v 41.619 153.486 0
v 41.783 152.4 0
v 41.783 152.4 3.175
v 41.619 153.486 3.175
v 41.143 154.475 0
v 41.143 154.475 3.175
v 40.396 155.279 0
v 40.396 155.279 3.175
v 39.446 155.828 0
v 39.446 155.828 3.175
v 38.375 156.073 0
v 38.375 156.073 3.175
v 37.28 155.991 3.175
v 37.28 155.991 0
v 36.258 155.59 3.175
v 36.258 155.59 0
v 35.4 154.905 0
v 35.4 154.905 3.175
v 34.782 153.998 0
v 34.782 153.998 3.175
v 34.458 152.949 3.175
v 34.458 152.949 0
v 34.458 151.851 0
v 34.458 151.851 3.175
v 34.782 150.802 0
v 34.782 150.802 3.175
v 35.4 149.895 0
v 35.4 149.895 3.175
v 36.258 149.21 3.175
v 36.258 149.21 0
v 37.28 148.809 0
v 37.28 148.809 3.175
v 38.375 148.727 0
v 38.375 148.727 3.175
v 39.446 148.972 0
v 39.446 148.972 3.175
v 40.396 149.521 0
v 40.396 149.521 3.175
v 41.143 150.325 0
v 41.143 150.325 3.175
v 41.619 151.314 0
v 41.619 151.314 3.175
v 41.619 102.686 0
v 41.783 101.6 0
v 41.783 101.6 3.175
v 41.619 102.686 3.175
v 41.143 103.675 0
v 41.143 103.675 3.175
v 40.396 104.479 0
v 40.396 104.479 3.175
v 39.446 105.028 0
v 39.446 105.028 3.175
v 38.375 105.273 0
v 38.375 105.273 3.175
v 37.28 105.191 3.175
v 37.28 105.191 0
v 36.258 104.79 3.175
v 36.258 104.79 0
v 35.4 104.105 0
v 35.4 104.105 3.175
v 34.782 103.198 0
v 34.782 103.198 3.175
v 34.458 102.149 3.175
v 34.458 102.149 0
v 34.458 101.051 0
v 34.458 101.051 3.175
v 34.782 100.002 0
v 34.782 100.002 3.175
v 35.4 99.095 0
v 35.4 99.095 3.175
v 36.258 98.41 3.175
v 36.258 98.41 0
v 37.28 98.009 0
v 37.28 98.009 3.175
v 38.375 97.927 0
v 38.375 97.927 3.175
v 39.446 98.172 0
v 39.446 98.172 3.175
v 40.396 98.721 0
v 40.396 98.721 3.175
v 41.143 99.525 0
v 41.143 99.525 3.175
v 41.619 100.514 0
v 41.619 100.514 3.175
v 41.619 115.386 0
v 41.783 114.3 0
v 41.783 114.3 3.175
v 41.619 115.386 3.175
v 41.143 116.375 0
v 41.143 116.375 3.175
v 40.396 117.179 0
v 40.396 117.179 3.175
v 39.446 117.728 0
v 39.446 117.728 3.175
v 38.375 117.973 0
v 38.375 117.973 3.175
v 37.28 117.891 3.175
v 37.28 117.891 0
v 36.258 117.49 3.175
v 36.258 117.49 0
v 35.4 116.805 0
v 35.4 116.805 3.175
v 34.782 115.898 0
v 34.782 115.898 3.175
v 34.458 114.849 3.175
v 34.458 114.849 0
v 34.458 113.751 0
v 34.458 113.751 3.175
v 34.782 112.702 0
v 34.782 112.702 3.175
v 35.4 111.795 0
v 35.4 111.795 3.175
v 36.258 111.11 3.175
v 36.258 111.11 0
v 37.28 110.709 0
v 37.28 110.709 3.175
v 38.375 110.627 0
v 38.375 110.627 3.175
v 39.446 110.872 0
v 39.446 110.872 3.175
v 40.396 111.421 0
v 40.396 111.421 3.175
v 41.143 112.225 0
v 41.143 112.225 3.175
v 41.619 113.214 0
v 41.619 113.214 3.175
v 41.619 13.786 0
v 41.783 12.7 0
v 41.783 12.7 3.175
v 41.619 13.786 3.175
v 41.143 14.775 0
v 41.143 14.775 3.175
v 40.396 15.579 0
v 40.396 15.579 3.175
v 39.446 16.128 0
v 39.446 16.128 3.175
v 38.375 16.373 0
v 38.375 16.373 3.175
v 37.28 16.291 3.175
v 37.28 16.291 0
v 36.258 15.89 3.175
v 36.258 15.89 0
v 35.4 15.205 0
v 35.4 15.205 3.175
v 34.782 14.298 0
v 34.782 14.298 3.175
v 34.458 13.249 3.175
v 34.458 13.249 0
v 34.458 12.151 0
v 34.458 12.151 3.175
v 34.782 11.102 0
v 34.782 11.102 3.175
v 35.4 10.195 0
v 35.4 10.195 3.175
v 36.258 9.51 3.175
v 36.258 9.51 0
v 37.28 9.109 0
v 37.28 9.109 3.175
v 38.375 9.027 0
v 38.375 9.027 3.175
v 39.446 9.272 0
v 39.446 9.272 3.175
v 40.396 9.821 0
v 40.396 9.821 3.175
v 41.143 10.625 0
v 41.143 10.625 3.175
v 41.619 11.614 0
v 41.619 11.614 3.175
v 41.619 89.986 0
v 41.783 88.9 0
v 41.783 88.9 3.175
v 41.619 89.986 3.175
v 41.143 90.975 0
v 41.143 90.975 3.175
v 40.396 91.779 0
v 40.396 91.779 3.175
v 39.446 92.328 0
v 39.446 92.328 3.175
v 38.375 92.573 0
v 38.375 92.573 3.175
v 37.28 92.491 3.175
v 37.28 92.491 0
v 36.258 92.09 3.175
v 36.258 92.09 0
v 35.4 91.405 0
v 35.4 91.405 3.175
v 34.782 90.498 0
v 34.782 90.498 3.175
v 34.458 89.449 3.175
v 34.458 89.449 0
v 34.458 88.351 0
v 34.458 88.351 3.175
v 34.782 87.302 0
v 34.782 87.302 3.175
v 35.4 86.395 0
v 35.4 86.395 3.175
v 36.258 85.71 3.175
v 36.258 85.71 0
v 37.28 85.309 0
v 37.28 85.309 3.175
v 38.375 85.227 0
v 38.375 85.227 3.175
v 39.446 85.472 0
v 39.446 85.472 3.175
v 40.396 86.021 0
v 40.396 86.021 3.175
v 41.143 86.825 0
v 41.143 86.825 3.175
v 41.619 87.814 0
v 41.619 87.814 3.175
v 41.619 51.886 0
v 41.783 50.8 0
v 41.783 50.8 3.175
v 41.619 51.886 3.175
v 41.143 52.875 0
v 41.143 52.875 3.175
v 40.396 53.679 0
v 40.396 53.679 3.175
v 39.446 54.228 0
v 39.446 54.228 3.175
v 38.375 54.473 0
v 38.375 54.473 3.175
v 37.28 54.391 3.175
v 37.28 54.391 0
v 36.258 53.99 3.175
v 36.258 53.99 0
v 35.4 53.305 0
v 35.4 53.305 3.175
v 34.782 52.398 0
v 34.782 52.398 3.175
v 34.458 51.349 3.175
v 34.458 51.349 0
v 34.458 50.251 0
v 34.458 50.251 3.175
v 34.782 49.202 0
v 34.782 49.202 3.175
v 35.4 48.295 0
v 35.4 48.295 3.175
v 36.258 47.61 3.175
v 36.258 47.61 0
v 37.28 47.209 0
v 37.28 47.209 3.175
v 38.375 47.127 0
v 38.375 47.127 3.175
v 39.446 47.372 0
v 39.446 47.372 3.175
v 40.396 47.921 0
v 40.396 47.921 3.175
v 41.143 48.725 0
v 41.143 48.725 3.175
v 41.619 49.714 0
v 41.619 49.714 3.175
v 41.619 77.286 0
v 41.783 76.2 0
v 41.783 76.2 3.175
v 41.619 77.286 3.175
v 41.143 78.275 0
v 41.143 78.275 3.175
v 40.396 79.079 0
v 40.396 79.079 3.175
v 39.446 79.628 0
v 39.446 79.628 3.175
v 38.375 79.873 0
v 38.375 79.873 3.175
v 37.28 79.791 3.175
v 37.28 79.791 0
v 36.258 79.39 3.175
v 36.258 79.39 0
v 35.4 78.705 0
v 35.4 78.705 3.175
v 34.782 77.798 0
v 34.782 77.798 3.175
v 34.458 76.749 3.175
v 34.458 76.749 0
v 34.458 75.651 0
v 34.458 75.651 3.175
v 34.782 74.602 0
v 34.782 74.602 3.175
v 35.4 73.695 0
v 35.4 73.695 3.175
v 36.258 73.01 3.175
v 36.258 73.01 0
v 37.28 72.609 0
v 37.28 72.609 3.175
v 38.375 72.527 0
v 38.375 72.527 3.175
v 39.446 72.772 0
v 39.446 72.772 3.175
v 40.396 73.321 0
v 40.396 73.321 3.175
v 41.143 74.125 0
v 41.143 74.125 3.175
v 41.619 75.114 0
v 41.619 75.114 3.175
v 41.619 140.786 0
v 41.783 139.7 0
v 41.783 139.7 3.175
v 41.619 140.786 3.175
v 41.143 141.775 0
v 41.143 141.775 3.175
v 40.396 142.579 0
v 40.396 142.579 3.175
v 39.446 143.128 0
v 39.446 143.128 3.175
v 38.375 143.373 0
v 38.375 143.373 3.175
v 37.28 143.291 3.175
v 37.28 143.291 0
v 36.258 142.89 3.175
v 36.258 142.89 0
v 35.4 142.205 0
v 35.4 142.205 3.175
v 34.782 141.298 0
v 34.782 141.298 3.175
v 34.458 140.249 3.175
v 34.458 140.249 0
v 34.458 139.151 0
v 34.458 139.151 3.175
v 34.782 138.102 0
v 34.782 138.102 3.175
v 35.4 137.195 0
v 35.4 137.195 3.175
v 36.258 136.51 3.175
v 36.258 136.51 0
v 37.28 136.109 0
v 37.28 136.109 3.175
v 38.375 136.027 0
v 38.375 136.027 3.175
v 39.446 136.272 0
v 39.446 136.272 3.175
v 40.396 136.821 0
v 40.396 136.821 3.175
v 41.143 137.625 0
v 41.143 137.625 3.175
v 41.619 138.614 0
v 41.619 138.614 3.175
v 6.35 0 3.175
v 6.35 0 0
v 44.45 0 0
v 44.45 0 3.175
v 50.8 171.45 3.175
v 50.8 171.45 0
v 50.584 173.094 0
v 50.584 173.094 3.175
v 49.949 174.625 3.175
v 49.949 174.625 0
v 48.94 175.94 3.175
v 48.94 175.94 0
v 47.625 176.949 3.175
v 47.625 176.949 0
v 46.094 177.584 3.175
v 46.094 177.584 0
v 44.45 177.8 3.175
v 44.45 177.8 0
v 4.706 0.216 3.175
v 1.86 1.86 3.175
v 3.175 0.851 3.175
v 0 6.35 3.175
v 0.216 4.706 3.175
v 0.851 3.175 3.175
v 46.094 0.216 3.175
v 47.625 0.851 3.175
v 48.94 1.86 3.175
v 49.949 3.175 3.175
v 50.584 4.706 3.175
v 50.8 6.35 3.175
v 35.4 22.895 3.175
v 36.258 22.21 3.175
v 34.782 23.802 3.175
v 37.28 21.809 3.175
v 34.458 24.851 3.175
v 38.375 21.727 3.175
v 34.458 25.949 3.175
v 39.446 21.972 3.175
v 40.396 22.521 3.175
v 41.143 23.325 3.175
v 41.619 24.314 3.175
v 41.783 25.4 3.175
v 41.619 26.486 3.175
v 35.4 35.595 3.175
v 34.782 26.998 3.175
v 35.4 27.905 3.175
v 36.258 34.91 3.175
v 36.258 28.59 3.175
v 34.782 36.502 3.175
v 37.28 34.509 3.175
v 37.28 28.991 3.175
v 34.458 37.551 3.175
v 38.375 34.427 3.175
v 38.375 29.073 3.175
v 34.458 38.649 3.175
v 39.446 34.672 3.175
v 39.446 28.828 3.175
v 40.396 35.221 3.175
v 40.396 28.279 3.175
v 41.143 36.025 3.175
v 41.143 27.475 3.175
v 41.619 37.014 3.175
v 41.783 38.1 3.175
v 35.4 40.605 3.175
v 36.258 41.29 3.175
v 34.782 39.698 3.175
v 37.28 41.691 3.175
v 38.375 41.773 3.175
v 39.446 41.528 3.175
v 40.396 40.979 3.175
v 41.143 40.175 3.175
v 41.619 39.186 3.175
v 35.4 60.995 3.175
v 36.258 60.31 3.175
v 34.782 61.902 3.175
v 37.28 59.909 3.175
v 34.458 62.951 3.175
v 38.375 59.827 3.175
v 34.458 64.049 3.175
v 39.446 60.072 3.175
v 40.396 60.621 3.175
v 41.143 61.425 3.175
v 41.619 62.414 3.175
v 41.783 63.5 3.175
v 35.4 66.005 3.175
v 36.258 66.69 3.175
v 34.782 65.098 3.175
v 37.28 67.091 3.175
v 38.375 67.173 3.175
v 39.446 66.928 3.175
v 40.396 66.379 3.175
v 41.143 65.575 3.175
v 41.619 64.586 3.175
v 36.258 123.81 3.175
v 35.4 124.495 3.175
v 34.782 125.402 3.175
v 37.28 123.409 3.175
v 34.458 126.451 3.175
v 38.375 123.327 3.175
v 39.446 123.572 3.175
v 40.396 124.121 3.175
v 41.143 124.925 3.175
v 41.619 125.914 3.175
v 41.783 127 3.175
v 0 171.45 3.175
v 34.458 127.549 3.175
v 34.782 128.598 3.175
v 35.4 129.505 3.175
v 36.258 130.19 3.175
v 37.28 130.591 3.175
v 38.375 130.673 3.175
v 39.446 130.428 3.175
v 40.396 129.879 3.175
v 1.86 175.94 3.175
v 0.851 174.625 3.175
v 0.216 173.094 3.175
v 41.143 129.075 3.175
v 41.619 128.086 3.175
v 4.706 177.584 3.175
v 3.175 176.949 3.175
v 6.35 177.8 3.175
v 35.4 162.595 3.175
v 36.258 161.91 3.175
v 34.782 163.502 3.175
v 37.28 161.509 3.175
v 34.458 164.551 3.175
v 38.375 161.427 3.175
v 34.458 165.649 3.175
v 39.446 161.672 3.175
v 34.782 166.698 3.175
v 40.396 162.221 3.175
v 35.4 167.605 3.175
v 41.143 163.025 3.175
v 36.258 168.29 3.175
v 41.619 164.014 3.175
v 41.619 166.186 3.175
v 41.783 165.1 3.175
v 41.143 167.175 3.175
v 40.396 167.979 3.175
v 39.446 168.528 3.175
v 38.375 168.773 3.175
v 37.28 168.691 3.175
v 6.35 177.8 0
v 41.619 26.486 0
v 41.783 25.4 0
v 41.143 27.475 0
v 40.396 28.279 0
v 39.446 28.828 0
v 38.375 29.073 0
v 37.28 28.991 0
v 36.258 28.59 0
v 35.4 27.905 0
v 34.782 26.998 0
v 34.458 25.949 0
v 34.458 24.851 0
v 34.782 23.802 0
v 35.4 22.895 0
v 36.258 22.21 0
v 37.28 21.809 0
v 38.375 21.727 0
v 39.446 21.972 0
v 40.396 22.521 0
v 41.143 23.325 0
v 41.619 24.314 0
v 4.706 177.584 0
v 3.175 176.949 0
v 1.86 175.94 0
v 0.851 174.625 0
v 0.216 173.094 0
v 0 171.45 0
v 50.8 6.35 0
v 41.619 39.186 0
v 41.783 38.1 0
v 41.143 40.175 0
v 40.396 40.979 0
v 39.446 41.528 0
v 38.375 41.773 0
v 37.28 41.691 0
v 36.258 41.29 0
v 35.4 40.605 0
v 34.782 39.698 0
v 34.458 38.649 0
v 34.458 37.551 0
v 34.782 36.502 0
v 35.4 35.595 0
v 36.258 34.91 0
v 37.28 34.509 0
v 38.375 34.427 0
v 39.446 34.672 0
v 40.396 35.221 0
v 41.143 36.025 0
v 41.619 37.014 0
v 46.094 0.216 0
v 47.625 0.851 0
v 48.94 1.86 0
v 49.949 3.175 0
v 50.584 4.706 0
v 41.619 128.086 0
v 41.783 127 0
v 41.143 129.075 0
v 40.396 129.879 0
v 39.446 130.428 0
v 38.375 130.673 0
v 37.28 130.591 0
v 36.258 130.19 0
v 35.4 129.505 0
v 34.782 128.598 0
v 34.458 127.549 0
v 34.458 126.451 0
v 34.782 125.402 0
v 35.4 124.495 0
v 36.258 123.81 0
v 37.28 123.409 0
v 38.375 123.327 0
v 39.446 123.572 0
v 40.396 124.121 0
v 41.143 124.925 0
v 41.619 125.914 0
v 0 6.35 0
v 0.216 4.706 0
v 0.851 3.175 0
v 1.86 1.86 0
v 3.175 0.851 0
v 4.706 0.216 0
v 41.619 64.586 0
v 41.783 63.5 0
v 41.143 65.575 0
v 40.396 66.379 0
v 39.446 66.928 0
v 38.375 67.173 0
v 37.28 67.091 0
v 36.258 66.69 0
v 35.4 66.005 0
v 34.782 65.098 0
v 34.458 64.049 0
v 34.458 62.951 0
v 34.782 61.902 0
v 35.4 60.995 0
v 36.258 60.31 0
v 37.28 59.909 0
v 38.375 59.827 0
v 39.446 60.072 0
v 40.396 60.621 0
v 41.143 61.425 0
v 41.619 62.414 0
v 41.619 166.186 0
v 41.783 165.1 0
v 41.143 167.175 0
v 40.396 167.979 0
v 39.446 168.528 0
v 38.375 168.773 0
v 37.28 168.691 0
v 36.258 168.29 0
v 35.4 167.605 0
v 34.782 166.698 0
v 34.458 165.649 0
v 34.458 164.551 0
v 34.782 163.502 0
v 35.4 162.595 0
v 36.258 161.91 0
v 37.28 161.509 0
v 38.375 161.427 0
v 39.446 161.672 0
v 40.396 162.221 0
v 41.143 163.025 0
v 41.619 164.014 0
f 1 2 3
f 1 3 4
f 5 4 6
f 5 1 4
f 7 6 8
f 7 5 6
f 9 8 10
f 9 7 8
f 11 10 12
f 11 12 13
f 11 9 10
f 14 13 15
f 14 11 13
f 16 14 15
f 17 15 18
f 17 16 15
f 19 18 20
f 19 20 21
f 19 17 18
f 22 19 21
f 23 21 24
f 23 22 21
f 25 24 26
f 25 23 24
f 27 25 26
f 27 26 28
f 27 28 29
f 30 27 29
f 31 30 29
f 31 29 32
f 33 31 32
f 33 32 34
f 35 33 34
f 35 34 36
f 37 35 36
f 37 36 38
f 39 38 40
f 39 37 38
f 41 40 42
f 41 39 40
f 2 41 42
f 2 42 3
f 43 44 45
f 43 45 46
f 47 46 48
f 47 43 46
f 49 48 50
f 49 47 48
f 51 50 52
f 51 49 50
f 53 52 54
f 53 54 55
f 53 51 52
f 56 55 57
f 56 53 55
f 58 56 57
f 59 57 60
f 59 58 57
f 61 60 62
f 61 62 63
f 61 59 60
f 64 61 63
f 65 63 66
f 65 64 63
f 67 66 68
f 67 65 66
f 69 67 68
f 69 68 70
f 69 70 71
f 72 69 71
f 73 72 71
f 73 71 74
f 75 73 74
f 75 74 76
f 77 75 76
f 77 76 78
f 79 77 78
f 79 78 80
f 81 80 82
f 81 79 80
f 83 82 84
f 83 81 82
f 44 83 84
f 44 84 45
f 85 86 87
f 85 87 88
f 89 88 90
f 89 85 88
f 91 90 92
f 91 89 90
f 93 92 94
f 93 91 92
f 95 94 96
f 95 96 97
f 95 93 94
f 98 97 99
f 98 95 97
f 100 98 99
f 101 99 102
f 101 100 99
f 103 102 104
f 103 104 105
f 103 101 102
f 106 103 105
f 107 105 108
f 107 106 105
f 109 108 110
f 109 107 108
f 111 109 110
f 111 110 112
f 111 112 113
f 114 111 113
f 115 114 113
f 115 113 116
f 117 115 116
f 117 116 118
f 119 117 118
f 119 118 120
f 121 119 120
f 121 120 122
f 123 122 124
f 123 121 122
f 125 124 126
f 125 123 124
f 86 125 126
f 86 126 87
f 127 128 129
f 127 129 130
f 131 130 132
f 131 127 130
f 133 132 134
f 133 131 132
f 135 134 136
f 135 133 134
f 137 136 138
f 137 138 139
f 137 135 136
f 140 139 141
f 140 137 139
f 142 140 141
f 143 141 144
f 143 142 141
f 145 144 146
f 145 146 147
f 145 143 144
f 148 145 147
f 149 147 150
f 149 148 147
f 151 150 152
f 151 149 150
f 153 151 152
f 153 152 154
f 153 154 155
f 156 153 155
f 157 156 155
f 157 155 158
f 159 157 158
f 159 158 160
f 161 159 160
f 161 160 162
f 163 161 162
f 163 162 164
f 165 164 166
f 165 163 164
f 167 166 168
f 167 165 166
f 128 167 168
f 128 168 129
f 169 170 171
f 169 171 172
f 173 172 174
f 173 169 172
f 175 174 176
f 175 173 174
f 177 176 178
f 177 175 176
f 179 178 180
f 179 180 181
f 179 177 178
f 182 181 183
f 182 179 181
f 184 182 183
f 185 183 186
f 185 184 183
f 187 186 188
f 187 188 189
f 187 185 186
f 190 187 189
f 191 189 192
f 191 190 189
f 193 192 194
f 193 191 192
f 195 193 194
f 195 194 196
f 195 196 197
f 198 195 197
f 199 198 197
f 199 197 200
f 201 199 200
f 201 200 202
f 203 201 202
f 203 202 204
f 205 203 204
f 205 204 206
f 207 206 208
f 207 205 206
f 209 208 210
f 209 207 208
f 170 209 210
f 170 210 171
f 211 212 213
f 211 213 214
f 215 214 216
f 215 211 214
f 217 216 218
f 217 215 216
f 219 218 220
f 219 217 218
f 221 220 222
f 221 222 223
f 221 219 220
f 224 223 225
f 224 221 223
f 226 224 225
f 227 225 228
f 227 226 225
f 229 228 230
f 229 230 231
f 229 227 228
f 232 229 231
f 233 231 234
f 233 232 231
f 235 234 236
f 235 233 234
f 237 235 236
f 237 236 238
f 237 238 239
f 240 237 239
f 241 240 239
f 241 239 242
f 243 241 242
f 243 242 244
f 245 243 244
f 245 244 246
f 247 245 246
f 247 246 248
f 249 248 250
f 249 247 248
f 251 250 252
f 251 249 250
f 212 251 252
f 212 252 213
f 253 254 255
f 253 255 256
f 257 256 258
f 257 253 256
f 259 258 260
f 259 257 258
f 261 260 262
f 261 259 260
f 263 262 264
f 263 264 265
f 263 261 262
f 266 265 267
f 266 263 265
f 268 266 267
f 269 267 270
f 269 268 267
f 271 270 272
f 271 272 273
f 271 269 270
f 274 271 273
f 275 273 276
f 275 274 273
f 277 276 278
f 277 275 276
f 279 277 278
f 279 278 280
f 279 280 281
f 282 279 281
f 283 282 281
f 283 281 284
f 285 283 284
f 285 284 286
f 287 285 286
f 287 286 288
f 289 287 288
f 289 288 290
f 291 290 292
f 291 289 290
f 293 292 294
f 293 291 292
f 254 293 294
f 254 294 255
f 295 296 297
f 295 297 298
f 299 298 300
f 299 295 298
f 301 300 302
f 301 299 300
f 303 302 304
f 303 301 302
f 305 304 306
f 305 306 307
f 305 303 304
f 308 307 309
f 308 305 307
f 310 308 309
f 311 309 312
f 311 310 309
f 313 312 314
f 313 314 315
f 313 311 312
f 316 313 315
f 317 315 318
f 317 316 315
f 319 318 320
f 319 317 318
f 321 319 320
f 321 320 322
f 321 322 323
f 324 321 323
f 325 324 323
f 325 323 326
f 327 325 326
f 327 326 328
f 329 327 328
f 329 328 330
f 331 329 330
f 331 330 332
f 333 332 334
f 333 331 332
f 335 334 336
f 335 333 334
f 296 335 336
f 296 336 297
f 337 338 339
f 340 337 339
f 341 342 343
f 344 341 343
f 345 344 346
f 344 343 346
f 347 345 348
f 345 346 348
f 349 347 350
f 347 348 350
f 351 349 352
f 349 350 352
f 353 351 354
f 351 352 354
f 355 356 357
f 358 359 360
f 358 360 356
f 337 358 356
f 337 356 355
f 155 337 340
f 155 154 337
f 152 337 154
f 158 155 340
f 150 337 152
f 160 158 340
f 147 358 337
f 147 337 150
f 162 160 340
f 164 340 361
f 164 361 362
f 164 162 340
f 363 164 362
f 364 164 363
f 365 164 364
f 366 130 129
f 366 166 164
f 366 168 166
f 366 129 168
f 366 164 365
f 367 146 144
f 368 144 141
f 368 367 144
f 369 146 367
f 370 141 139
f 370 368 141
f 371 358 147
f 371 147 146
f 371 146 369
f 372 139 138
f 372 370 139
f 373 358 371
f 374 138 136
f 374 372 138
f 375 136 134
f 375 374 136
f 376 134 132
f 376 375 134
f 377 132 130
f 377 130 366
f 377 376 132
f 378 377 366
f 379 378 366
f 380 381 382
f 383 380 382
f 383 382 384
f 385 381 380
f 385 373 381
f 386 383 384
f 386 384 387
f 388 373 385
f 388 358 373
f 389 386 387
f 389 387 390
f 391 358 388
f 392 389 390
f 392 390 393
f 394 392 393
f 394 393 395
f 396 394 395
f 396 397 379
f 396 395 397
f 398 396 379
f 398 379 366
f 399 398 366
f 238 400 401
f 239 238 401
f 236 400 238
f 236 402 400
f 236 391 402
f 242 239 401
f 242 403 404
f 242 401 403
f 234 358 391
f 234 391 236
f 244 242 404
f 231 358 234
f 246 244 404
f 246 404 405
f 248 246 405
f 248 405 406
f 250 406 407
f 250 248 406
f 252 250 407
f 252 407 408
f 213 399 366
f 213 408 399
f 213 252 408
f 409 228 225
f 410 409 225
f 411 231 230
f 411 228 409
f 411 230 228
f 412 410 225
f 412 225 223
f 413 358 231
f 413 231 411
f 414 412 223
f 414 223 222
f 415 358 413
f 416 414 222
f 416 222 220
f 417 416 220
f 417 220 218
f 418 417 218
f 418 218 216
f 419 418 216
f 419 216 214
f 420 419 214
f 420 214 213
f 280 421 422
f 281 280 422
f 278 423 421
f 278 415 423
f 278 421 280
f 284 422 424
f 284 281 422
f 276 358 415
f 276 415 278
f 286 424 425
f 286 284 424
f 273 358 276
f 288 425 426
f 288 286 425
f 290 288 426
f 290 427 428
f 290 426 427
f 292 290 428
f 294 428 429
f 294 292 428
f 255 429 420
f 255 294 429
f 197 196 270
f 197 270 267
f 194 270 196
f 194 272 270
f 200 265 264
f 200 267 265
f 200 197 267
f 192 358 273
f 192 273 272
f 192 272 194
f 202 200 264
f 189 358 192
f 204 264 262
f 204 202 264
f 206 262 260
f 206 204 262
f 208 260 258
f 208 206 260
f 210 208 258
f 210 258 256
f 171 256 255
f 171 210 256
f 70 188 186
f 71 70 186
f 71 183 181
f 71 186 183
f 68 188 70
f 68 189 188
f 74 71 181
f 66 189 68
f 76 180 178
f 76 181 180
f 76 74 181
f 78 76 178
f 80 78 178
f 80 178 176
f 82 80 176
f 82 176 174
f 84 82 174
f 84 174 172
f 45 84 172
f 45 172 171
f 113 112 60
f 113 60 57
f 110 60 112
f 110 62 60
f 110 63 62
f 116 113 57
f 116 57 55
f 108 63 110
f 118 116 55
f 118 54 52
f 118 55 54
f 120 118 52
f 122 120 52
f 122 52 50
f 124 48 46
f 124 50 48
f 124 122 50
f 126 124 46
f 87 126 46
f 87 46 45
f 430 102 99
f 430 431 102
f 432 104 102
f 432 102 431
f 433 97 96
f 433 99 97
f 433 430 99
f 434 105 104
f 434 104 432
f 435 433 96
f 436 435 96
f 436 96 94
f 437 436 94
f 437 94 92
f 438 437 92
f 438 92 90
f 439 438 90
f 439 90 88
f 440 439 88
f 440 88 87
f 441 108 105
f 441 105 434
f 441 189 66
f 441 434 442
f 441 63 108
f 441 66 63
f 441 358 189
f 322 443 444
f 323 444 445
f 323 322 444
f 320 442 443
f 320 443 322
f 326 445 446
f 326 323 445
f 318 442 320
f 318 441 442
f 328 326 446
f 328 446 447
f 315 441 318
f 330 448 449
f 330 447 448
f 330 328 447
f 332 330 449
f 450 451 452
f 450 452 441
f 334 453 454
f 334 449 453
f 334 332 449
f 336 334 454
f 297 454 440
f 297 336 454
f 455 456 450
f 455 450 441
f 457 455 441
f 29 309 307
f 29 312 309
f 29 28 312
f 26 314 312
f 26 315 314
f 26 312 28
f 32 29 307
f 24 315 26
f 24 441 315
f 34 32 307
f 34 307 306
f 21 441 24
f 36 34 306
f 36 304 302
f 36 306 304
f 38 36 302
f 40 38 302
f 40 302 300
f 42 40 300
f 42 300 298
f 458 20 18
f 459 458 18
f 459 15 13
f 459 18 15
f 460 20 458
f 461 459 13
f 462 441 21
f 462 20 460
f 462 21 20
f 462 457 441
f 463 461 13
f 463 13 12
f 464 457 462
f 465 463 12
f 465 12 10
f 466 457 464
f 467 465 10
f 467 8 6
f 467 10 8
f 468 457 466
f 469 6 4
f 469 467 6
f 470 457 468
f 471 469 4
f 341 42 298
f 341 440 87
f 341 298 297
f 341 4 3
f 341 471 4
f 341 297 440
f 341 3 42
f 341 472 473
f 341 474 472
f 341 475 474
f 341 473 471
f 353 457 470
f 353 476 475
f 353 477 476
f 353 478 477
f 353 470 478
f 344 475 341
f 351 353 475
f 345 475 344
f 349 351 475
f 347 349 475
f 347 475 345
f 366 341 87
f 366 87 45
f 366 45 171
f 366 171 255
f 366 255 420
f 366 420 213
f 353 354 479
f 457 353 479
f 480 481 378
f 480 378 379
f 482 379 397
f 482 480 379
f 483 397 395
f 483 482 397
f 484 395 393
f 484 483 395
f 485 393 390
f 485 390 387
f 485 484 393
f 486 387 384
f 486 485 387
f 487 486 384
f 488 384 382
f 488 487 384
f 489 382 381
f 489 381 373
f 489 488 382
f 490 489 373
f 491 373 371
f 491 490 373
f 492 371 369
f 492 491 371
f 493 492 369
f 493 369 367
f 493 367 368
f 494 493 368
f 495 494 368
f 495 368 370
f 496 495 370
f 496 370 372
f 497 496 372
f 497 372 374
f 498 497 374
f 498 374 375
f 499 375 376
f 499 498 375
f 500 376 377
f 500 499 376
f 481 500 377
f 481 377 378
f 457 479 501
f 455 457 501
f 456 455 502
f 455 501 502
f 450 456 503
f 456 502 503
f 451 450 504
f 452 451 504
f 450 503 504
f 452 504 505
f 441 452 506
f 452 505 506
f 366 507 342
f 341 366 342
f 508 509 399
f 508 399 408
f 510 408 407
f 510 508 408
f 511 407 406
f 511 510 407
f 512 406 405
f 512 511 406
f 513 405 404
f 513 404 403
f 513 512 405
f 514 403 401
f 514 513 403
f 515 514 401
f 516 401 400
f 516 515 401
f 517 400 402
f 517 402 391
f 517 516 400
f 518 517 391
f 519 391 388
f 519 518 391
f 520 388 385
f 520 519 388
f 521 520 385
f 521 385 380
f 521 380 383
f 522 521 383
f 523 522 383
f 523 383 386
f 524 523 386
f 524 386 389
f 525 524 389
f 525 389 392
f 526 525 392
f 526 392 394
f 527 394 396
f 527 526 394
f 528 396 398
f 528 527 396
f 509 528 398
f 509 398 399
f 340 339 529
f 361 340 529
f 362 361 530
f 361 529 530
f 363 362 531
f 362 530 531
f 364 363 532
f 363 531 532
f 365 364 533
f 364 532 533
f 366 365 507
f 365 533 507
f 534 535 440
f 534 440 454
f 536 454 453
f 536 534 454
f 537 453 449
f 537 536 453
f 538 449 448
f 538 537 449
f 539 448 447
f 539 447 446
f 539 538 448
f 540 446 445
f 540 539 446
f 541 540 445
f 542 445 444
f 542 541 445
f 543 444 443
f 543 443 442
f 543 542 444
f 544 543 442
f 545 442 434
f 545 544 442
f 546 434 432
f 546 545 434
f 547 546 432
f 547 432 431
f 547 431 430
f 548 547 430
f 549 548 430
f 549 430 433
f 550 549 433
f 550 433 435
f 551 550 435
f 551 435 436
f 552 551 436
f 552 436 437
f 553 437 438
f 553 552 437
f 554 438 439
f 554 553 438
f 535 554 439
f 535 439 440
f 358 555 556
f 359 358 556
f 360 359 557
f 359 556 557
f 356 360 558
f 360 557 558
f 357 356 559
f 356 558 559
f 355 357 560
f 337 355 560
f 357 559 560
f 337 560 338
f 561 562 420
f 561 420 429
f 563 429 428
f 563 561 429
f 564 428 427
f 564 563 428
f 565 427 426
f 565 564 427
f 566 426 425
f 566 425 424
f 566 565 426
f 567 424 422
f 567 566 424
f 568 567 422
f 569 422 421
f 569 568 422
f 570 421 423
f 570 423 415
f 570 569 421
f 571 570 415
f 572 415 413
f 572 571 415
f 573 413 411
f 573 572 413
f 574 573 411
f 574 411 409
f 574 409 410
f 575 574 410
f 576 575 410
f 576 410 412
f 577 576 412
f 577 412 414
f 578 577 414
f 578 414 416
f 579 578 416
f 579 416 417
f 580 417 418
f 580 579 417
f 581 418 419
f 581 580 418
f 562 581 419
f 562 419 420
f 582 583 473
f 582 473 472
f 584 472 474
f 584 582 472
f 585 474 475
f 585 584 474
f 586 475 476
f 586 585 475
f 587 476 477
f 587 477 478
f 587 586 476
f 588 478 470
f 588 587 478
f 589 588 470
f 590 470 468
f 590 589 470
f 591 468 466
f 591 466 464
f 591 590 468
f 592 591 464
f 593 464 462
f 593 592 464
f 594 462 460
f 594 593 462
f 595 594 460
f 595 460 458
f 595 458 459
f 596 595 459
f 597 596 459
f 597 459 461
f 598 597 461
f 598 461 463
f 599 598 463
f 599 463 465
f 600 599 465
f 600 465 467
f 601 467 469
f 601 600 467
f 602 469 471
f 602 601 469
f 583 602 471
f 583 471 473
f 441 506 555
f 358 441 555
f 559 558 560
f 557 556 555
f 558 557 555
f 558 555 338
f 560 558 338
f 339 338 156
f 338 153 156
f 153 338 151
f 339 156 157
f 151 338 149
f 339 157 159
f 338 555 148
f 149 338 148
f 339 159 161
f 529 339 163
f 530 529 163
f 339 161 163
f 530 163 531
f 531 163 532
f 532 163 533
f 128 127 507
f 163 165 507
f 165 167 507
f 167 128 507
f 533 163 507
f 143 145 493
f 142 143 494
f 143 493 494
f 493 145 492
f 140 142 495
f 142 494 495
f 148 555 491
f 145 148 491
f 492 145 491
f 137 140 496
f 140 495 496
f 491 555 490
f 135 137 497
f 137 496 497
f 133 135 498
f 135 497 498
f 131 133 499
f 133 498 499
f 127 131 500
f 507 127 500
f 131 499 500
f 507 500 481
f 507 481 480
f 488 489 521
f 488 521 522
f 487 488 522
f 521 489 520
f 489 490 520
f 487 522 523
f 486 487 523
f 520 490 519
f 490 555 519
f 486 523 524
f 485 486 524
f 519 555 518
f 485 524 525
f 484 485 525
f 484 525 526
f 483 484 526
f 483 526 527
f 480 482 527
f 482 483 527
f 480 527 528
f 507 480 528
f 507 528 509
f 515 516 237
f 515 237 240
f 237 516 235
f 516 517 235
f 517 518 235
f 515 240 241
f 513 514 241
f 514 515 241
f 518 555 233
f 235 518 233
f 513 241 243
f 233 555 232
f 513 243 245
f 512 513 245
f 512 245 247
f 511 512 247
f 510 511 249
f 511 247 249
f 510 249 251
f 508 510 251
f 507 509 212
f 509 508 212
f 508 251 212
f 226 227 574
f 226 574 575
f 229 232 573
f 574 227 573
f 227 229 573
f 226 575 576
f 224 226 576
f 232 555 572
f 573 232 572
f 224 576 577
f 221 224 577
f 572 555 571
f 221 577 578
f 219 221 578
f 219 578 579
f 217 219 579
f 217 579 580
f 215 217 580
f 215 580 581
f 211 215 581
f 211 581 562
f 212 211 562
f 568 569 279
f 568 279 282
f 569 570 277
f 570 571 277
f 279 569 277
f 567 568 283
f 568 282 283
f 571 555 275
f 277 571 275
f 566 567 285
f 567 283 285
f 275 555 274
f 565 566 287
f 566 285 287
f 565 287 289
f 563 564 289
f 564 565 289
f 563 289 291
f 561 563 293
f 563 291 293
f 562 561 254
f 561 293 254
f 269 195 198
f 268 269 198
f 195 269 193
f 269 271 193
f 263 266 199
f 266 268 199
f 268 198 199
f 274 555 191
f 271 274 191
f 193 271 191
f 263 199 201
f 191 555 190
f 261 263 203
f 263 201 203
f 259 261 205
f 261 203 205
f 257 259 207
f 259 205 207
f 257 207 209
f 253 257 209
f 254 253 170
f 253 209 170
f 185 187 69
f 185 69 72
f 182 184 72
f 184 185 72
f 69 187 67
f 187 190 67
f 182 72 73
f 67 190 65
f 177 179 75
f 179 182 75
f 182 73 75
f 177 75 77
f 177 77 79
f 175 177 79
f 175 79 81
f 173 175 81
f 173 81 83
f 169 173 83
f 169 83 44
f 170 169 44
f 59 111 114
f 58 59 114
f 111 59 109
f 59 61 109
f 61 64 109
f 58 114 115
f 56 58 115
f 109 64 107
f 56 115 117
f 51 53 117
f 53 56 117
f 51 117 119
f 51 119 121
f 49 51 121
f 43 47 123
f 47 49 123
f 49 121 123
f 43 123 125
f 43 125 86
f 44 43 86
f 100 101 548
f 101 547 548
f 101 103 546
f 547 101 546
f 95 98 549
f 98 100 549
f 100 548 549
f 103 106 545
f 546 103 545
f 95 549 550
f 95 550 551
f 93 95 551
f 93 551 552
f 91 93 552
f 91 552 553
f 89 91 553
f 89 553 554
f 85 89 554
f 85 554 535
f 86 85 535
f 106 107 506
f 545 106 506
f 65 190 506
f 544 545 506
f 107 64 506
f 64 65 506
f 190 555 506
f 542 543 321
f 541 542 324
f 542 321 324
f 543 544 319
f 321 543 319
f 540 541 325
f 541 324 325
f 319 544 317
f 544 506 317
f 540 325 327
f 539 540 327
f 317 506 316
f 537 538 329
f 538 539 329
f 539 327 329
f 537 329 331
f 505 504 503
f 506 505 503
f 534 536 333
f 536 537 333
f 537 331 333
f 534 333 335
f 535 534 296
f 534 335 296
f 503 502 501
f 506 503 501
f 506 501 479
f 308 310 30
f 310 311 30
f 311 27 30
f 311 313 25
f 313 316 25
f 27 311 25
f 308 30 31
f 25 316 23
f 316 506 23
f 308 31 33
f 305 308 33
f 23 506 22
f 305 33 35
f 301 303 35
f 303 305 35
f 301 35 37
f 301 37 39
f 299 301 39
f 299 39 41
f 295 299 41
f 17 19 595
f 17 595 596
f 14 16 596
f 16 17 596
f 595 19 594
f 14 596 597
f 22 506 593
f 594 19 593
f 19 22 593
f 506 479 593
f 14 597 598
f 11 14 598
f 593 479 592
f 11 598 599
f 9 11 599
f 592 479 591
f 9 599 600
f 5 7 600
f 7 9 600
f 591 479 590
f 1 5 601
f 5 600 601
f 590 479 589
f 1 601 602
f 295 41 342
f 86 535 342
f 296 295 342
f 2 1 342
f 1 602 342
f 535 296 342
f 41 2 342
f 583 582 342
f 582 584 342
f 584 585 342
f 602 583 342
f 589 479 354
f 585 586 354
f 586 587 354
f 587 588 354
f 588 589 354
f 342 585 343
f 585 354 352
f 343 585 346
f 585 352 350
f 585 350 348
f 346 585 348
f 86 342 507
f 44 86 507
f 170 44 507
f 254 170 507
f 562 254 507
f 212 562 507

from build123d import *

# Parameters (mm, degrees)
F0_R     = 3.683
F1_DEPTH = 3.175


with BuildPart() as f1:
    # F0 (on Top) → F1 (new body)
    with BuildSketch(Plane.XY):
        with BuildLine():
            ThreePointArc((0, 6.35), (1.859872, 1.859872), (6.35, 0))
            Line((6.35, 0), (44.45, 0))
            ThreePointArc((44.45, 0), (48.940128, 1.859872), (50.8, 6.35))
            Line((50.8, 6.35), (50.8, 171.45))
            ThreePointArc((50.8, 171.45), (48.940128, 175.940128), (44.45, 177.8))
            Line((44.45, 177.8), (6.35, 177.8))
            ThreePointArc((6.35, 177.8), (1.859872, 175.940128), (0, 171.45))
            Line((0, 171.45), (0, 6.35))
        make_face()
        with Locations((38.1, 12.7)):
            Circle(F0_R, mode=Mode.SUBTRACT)
        with Locations((38.1, 25.4)):
            Circle(F0_R, mode=Mode.SUBTRACT)
        with Locations((38.1, 38.1)):
            Circle(F0_R, mode=Mode.SUBTRACT)
        with Locations((38.1, 50.8)):
            Circle(F0_R, mode=Mode.SUBTRACT)
        with Locations((38.1, 63.5)):
            Circle(F0_R, mode=Mode.SUBTRACT)
        with Locations((38.1, 76.2)):
            Circle(F0_R, mode=Mode.SUBTRACT)
        with Locations((38.1, 88.9)):
            Circle(F0_R, mode=Mode.SUBTRACT)
        with Locations((38.1, 101.6)):
            Circle(F0_R, mode=Mode.SUBTRACT)
        with Locations((38.1, 114.3)):
            Circle(F0_R, mode=Mode.SUBTRACT)
        with Locations((38.1, 127)):
            Circle(F0_R, mode=Mode.SUBTRACT)
        with Locations((38.1, 139.7)):
            Circle(F0_R, mode=Mode.SUBTRACT)
        with Locations((38.1, 152.4)):
            Circle(F0_R, mode=Mode.SUBTRACT)
        with Locations((38.1, 165.1)):
            Circle(F0_R, mode=Mode.SUBTRACT)
    extrude(amount=F1_DEPTH)


solid = f1.part
